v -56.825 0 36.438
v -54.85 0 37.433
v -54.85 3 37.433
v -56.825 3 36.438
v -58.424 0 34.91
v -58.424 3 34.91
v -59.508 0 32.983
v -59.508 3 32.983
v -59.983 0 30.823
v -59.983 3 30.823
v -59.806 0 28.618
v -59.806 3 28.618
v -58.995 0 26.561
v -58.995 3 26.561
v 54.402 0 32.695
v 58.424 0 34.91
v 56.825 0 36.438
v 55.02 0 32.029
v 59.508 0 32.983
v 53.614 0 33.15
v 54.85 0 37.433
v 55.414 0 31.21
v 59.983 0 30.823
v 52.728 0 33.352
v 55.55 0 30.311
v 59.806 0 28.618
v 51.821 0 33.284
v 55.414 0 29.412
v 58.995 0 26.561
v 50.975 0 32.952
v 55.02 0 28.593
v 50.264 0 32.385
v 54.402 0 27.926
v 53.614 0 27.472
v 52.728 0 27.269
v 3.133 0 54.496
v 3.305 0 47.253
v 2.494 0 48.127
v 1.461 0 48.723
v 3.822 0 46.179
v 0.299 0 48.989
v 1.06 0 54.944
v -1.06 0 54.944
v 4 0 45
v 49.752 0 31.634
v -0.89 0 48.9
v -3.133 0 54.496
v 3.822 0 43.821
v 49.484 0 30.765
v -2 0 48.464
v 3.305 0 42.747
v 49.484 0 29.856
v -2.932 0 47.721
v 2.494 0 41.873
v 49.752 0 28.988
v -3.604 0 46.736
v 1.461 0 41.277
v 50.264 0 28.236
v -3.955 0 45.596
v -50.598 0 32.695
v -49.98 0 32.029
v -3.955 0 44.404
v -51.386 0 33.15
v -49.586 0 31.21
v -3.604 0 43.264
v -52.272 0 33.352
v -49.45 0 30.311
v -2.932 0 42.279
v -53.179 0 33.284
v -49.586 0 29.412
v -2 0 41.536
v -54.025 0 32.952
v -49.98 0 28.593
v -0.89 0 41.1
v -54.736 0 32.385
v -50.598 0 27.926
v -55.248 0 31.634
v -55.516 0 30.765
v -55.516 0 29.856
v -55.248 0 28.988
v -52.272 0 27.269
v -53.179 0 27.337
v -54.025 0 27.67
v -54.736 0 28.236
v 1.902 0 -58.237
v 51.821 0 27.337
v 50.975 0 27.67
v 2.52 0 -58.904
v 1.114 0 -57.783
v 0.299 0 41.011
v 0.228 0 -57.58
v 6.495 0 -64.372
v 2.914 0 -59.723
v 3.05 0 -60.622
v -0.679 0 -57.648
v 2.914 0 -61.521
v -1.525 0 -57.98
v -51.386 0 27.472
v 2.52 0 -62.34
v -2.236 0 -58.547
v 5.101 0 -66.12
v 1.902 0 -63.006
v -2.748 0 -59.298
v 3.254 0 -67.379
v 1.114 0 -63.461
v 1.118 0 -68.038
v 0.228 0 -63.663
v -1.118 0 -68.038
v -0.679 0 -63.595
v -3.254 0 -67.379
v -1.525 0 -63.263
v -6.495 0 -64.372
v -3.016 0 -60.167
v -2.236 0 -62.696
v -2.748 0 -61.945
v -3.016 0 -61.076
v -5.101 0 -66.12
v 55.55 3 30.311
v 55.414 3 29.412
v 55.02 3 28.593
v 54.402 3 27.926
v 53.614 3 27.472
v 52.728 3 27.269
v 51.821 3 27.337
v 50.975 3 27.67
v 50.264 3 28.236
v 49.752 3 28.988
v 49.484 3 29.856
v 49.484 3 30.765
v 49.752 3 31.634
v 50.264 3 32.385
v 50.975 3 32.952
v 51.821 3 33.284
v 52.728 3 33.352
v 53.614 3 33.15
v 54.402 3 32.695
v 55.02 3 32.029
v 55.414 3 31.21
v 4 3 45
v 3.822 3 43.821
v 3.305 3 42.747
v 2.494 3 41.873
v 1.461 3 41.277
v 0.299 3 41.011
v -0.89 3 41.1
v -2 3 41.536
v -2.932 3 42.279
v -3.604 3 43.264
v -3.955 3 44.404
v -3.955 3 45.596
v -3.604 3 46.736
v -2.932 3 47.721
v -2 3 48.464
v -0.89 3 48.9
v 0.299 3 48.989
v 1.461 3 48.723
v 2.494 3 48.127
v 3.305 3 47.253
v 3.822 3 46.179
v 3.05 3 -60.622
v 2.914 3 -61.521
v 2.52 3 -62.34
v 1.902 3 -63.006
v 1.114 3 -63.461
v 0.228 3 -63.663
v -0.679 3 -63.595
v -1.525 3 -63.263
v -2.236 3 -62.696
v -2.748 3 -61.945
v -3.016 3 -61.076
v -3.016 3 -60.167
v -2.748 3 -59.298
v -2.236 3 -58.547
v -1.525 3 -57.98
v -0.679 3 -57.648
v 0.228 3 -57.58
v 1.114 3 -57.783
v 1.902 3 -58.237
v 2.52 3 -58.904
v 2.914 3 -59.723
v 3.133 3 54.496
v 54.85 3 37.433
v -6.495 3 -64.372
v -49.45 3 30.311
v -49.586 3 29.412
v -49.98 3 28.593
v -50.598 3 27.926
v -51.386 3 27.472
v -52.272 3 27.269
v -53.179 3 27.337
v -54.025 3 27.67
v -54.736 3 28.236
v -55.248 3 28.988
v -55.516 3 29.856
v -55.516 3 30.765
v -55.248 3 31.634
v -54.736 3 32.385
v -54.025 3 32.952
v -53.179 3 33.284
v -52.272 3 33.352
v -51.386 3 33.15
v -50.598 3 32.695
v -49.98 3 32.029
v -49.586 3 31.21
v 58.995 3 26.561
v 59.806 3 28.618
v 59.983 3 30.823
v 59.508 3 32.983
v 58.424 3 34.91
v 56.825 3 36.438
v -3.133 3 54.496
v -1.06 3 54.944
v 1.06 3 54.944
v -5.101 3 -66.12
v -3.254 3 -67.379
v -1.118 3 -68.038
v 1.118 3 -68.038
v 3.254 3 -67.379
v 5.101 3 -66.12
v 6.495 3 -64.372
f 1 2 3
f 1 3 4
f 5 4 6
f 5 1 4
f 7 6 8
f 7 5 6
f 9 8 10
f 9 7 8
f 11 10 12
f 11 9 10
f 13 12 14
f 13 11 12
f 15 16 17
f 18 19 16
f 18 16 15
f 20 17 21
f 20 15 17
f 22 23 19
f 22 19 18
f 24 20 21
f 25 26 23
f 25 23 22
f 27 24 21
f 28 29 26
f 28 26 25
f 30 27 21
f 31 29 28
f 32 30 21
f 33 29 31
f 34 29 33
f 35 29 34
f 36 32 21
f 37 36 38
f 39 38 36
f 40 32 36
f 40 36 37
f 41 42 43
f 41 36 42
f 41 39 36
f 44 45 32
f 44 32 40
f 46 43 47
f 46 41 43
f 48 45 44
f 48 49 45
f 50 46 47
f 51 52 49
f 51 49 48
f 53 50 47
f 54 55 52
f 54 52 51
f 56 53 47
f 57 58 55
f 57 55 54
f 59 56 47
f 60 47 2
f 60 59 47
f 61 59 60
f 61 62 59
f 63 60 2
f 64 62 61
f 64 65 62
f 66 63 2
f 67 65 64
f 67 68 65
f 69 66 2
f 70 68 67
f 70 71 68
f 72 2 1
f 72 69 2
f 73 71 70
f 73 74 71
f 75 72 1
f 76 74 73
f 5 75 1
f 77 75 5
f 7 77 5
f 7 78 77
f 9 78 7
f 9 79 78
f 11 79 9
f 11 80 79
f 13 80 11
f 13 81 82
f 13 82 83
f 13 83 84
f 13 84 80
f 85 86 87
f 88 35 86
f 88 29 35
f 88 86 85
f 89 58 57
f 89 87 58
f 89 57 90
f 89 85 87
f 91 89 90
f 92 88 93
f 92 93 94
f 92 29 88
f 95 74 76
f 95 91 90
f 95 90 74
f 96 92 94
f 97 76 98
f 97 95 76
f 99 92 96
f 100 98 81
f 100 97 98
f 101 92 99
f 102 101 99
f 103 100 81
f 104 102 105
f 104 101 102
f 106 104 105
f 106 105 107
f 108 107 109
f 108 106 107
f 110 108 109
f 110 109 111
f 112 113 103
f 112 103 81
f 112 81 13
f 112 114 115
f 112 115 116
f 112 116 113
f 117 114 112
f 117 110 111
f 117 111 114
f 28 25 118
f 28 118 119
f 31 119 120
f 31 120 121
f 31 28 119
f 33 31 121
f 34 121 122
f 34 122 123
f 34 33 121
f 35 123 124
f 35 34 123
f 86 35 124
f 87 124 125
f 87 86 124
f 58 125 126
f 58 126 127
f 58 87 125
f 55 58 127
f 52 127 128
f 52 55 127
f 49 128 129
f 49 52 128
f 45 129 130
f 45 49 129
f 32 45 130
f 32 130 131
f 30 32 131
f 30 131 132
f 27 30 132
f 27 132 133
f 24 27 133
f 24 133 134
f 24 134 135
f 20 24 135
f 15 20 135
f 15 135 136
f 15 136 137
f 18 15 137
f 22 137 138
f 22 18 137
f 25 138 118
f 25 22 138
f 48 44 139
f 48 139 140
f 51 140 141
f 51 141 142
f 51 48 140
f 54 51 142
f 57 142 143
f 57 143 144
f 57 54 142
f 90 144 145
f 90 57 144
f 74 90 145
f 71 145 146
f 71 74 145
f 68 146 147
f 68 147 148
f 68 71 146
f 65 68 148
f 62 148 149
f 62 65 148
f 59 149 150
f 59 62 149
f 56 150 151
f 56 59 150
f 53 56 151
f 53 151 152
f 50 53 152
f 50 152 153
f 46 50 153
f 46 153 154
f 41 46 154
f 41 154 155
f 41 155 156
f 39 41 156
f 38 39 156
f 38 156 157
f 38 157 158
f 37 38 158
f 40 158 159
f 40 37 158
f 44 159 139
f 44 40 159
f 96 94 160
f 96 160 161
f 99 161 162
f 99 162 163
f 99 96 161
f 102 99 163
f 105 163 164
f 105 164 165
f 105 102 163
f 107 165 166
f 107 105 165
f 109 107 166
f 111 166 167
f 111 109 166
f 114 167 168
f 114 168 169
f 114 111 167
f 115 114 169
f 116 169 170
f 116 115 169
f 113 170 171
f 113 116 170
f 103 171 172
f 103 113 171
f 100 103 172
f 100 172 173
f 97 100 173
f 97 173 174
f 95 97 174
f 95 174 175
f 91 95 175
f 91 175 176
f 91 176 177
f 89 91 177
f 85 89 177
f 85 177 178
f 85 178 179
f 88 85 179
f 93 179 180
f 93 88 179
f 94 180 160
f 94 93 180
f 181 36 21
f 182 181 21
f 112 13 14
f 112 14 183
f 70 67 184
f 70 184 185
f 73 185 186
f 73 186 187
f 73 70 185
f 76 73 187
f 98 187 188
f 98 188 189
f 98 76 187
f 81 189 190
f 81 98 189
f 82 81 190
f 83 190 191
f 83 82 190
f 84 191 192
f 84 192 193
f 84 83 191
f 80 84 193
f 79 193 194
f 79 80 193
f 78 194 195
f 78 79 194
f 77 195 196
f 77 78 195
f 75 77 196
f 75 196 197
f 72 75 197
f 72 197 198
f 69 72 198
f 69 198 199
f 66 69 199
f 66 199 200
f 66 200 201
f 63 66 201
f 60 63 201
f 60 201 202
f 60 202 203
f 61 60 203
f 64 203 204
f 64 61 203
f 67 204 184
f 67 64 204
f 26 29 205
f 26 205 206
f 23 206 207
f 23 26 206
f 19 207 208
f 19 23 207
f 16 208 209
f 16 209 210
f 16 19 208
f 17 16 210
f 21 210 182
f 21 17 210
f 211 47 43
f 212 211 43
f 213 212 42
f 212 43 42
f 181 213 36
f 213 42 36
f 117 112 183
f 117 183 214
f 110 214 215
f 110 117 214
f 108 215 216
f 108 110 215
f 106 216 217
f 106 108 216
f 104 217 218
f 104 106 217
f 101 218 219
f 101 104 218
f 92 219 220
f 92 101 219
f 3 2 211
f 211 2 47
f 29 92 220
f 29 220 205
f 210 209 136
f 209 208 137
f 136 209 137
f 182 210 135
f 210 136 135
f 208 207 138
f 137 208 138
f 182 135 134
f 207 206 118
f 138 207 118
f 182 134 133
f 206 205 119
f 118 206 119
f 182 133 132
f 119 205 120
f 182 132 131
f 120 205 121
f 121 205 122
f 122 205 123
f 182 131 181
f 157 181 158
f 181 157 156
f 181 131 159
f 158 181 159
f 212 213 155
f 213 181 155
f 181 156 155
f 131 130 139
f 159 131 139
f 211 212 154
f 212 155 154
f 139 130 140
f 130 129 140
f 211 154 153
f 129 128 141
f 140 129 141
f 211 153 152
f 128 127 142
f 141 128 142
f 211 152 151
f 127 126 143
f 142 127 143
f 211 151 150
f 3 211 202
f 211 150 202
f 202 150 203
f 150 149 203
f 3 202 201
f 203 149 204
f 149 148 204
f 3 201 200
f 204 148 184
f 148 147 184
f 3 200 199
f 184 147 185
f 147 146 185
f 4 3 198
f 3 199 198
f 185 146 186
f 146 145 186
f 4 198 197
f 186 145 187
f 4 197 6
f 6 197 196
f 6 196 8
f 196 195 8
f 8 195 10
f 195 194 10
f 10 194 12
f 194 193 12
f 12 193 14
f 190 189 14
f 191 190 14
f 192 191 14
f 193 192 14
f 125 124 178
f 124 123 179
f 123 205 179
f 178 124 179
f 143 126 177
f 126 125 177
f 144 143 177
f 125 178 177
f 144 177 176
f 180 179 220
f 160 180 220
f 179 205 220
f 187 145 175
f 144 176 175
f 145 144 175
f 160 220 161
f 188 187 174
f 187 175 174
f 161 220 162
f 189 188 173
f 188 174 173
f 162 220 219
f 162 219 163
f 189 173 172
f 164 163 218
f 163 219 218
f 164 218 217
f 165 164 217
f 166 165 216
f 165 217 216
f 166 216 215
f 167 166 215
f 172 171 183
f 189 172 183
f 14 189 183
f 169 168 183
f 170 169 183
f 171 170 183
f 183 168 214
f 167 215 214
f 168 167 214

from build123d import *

# Parameters (mm, degrees)
SKETCH1_R           = 3.05
SKETCH1_R_2         = 4
BOSS_EXTRUDE1_DEPTH = 3


with BuildPart() as part:
    # Sketch1 → Boss-Extrude1 (new body)
    with BuildSketch(Plane(origin=(0, 0, 0), x_dir=(1, 0, 0), z_dir=(0, 1, 0))):
        with BuildLine():
            Line((6.495190528, 64.371778265), (58.995190528, -26.560889132))
            ThreePointArc((58.995190528, -26.560889132), (58.995190528, -34.060889132), (52.5, -37.810889132))
            Line((52.5, -37.810889132), (-52.5, -37.810889132))
            ThreePointArc((-52.5, -37.810889132), (-58.995190528, -34.060889132), (-58.995190528, -26.560889132))
            Line((-58.995190528, -26.560889132), (-6.495190528, 64.371778265))
            ThreePointArc((-6.495190528, 64.371778265), (0, 68.121778265), (6.495190528, 64.371778265))
        make_face()
        with Locations((-52.5, -30.310889132)):
            Circle(SKETCH1_R, mode=Mode.SUBTRACT)
        with Locations((52.5, -30.310889132)):
            Circle(SKETCH1_R, mode=Mode.SUBTRACT)
        with Locations((0, 60.621778265)):
            Circle(SKETCH1_R, mode=Mode.SUBTRACT)
        with BuildLine():
            ThreePointArc((-52.5, -37.810889132), (-53.69003782, -37.715874614), (-54.849923408, -37.433238462))
            Line((-54.849923408, -37.433238462), (-3.133231211, -54.496465773))
            ThreePointArc((-3.133231211, -54.496465773), (0, -55), (3.133231211, -54.496465773))
            Line((3.133231211, -54.496465773), (54.849923408, -37.433238462))
            ThreePointArc((54.849923408, -37.433238462), (53.69003782, -37.715874614), (52.5, -37.810889132))
            Line((52.5, -37.810889132), (-52.5, -37.810889132))
        make_face()
        with Locations((0, -45)):
            Circle(SKETCH1_R_2, mode=Mode.SUBTRACT)
    extrude(amount=BOSS_EXTRUDE1_DEPTH)


solid = part.part
